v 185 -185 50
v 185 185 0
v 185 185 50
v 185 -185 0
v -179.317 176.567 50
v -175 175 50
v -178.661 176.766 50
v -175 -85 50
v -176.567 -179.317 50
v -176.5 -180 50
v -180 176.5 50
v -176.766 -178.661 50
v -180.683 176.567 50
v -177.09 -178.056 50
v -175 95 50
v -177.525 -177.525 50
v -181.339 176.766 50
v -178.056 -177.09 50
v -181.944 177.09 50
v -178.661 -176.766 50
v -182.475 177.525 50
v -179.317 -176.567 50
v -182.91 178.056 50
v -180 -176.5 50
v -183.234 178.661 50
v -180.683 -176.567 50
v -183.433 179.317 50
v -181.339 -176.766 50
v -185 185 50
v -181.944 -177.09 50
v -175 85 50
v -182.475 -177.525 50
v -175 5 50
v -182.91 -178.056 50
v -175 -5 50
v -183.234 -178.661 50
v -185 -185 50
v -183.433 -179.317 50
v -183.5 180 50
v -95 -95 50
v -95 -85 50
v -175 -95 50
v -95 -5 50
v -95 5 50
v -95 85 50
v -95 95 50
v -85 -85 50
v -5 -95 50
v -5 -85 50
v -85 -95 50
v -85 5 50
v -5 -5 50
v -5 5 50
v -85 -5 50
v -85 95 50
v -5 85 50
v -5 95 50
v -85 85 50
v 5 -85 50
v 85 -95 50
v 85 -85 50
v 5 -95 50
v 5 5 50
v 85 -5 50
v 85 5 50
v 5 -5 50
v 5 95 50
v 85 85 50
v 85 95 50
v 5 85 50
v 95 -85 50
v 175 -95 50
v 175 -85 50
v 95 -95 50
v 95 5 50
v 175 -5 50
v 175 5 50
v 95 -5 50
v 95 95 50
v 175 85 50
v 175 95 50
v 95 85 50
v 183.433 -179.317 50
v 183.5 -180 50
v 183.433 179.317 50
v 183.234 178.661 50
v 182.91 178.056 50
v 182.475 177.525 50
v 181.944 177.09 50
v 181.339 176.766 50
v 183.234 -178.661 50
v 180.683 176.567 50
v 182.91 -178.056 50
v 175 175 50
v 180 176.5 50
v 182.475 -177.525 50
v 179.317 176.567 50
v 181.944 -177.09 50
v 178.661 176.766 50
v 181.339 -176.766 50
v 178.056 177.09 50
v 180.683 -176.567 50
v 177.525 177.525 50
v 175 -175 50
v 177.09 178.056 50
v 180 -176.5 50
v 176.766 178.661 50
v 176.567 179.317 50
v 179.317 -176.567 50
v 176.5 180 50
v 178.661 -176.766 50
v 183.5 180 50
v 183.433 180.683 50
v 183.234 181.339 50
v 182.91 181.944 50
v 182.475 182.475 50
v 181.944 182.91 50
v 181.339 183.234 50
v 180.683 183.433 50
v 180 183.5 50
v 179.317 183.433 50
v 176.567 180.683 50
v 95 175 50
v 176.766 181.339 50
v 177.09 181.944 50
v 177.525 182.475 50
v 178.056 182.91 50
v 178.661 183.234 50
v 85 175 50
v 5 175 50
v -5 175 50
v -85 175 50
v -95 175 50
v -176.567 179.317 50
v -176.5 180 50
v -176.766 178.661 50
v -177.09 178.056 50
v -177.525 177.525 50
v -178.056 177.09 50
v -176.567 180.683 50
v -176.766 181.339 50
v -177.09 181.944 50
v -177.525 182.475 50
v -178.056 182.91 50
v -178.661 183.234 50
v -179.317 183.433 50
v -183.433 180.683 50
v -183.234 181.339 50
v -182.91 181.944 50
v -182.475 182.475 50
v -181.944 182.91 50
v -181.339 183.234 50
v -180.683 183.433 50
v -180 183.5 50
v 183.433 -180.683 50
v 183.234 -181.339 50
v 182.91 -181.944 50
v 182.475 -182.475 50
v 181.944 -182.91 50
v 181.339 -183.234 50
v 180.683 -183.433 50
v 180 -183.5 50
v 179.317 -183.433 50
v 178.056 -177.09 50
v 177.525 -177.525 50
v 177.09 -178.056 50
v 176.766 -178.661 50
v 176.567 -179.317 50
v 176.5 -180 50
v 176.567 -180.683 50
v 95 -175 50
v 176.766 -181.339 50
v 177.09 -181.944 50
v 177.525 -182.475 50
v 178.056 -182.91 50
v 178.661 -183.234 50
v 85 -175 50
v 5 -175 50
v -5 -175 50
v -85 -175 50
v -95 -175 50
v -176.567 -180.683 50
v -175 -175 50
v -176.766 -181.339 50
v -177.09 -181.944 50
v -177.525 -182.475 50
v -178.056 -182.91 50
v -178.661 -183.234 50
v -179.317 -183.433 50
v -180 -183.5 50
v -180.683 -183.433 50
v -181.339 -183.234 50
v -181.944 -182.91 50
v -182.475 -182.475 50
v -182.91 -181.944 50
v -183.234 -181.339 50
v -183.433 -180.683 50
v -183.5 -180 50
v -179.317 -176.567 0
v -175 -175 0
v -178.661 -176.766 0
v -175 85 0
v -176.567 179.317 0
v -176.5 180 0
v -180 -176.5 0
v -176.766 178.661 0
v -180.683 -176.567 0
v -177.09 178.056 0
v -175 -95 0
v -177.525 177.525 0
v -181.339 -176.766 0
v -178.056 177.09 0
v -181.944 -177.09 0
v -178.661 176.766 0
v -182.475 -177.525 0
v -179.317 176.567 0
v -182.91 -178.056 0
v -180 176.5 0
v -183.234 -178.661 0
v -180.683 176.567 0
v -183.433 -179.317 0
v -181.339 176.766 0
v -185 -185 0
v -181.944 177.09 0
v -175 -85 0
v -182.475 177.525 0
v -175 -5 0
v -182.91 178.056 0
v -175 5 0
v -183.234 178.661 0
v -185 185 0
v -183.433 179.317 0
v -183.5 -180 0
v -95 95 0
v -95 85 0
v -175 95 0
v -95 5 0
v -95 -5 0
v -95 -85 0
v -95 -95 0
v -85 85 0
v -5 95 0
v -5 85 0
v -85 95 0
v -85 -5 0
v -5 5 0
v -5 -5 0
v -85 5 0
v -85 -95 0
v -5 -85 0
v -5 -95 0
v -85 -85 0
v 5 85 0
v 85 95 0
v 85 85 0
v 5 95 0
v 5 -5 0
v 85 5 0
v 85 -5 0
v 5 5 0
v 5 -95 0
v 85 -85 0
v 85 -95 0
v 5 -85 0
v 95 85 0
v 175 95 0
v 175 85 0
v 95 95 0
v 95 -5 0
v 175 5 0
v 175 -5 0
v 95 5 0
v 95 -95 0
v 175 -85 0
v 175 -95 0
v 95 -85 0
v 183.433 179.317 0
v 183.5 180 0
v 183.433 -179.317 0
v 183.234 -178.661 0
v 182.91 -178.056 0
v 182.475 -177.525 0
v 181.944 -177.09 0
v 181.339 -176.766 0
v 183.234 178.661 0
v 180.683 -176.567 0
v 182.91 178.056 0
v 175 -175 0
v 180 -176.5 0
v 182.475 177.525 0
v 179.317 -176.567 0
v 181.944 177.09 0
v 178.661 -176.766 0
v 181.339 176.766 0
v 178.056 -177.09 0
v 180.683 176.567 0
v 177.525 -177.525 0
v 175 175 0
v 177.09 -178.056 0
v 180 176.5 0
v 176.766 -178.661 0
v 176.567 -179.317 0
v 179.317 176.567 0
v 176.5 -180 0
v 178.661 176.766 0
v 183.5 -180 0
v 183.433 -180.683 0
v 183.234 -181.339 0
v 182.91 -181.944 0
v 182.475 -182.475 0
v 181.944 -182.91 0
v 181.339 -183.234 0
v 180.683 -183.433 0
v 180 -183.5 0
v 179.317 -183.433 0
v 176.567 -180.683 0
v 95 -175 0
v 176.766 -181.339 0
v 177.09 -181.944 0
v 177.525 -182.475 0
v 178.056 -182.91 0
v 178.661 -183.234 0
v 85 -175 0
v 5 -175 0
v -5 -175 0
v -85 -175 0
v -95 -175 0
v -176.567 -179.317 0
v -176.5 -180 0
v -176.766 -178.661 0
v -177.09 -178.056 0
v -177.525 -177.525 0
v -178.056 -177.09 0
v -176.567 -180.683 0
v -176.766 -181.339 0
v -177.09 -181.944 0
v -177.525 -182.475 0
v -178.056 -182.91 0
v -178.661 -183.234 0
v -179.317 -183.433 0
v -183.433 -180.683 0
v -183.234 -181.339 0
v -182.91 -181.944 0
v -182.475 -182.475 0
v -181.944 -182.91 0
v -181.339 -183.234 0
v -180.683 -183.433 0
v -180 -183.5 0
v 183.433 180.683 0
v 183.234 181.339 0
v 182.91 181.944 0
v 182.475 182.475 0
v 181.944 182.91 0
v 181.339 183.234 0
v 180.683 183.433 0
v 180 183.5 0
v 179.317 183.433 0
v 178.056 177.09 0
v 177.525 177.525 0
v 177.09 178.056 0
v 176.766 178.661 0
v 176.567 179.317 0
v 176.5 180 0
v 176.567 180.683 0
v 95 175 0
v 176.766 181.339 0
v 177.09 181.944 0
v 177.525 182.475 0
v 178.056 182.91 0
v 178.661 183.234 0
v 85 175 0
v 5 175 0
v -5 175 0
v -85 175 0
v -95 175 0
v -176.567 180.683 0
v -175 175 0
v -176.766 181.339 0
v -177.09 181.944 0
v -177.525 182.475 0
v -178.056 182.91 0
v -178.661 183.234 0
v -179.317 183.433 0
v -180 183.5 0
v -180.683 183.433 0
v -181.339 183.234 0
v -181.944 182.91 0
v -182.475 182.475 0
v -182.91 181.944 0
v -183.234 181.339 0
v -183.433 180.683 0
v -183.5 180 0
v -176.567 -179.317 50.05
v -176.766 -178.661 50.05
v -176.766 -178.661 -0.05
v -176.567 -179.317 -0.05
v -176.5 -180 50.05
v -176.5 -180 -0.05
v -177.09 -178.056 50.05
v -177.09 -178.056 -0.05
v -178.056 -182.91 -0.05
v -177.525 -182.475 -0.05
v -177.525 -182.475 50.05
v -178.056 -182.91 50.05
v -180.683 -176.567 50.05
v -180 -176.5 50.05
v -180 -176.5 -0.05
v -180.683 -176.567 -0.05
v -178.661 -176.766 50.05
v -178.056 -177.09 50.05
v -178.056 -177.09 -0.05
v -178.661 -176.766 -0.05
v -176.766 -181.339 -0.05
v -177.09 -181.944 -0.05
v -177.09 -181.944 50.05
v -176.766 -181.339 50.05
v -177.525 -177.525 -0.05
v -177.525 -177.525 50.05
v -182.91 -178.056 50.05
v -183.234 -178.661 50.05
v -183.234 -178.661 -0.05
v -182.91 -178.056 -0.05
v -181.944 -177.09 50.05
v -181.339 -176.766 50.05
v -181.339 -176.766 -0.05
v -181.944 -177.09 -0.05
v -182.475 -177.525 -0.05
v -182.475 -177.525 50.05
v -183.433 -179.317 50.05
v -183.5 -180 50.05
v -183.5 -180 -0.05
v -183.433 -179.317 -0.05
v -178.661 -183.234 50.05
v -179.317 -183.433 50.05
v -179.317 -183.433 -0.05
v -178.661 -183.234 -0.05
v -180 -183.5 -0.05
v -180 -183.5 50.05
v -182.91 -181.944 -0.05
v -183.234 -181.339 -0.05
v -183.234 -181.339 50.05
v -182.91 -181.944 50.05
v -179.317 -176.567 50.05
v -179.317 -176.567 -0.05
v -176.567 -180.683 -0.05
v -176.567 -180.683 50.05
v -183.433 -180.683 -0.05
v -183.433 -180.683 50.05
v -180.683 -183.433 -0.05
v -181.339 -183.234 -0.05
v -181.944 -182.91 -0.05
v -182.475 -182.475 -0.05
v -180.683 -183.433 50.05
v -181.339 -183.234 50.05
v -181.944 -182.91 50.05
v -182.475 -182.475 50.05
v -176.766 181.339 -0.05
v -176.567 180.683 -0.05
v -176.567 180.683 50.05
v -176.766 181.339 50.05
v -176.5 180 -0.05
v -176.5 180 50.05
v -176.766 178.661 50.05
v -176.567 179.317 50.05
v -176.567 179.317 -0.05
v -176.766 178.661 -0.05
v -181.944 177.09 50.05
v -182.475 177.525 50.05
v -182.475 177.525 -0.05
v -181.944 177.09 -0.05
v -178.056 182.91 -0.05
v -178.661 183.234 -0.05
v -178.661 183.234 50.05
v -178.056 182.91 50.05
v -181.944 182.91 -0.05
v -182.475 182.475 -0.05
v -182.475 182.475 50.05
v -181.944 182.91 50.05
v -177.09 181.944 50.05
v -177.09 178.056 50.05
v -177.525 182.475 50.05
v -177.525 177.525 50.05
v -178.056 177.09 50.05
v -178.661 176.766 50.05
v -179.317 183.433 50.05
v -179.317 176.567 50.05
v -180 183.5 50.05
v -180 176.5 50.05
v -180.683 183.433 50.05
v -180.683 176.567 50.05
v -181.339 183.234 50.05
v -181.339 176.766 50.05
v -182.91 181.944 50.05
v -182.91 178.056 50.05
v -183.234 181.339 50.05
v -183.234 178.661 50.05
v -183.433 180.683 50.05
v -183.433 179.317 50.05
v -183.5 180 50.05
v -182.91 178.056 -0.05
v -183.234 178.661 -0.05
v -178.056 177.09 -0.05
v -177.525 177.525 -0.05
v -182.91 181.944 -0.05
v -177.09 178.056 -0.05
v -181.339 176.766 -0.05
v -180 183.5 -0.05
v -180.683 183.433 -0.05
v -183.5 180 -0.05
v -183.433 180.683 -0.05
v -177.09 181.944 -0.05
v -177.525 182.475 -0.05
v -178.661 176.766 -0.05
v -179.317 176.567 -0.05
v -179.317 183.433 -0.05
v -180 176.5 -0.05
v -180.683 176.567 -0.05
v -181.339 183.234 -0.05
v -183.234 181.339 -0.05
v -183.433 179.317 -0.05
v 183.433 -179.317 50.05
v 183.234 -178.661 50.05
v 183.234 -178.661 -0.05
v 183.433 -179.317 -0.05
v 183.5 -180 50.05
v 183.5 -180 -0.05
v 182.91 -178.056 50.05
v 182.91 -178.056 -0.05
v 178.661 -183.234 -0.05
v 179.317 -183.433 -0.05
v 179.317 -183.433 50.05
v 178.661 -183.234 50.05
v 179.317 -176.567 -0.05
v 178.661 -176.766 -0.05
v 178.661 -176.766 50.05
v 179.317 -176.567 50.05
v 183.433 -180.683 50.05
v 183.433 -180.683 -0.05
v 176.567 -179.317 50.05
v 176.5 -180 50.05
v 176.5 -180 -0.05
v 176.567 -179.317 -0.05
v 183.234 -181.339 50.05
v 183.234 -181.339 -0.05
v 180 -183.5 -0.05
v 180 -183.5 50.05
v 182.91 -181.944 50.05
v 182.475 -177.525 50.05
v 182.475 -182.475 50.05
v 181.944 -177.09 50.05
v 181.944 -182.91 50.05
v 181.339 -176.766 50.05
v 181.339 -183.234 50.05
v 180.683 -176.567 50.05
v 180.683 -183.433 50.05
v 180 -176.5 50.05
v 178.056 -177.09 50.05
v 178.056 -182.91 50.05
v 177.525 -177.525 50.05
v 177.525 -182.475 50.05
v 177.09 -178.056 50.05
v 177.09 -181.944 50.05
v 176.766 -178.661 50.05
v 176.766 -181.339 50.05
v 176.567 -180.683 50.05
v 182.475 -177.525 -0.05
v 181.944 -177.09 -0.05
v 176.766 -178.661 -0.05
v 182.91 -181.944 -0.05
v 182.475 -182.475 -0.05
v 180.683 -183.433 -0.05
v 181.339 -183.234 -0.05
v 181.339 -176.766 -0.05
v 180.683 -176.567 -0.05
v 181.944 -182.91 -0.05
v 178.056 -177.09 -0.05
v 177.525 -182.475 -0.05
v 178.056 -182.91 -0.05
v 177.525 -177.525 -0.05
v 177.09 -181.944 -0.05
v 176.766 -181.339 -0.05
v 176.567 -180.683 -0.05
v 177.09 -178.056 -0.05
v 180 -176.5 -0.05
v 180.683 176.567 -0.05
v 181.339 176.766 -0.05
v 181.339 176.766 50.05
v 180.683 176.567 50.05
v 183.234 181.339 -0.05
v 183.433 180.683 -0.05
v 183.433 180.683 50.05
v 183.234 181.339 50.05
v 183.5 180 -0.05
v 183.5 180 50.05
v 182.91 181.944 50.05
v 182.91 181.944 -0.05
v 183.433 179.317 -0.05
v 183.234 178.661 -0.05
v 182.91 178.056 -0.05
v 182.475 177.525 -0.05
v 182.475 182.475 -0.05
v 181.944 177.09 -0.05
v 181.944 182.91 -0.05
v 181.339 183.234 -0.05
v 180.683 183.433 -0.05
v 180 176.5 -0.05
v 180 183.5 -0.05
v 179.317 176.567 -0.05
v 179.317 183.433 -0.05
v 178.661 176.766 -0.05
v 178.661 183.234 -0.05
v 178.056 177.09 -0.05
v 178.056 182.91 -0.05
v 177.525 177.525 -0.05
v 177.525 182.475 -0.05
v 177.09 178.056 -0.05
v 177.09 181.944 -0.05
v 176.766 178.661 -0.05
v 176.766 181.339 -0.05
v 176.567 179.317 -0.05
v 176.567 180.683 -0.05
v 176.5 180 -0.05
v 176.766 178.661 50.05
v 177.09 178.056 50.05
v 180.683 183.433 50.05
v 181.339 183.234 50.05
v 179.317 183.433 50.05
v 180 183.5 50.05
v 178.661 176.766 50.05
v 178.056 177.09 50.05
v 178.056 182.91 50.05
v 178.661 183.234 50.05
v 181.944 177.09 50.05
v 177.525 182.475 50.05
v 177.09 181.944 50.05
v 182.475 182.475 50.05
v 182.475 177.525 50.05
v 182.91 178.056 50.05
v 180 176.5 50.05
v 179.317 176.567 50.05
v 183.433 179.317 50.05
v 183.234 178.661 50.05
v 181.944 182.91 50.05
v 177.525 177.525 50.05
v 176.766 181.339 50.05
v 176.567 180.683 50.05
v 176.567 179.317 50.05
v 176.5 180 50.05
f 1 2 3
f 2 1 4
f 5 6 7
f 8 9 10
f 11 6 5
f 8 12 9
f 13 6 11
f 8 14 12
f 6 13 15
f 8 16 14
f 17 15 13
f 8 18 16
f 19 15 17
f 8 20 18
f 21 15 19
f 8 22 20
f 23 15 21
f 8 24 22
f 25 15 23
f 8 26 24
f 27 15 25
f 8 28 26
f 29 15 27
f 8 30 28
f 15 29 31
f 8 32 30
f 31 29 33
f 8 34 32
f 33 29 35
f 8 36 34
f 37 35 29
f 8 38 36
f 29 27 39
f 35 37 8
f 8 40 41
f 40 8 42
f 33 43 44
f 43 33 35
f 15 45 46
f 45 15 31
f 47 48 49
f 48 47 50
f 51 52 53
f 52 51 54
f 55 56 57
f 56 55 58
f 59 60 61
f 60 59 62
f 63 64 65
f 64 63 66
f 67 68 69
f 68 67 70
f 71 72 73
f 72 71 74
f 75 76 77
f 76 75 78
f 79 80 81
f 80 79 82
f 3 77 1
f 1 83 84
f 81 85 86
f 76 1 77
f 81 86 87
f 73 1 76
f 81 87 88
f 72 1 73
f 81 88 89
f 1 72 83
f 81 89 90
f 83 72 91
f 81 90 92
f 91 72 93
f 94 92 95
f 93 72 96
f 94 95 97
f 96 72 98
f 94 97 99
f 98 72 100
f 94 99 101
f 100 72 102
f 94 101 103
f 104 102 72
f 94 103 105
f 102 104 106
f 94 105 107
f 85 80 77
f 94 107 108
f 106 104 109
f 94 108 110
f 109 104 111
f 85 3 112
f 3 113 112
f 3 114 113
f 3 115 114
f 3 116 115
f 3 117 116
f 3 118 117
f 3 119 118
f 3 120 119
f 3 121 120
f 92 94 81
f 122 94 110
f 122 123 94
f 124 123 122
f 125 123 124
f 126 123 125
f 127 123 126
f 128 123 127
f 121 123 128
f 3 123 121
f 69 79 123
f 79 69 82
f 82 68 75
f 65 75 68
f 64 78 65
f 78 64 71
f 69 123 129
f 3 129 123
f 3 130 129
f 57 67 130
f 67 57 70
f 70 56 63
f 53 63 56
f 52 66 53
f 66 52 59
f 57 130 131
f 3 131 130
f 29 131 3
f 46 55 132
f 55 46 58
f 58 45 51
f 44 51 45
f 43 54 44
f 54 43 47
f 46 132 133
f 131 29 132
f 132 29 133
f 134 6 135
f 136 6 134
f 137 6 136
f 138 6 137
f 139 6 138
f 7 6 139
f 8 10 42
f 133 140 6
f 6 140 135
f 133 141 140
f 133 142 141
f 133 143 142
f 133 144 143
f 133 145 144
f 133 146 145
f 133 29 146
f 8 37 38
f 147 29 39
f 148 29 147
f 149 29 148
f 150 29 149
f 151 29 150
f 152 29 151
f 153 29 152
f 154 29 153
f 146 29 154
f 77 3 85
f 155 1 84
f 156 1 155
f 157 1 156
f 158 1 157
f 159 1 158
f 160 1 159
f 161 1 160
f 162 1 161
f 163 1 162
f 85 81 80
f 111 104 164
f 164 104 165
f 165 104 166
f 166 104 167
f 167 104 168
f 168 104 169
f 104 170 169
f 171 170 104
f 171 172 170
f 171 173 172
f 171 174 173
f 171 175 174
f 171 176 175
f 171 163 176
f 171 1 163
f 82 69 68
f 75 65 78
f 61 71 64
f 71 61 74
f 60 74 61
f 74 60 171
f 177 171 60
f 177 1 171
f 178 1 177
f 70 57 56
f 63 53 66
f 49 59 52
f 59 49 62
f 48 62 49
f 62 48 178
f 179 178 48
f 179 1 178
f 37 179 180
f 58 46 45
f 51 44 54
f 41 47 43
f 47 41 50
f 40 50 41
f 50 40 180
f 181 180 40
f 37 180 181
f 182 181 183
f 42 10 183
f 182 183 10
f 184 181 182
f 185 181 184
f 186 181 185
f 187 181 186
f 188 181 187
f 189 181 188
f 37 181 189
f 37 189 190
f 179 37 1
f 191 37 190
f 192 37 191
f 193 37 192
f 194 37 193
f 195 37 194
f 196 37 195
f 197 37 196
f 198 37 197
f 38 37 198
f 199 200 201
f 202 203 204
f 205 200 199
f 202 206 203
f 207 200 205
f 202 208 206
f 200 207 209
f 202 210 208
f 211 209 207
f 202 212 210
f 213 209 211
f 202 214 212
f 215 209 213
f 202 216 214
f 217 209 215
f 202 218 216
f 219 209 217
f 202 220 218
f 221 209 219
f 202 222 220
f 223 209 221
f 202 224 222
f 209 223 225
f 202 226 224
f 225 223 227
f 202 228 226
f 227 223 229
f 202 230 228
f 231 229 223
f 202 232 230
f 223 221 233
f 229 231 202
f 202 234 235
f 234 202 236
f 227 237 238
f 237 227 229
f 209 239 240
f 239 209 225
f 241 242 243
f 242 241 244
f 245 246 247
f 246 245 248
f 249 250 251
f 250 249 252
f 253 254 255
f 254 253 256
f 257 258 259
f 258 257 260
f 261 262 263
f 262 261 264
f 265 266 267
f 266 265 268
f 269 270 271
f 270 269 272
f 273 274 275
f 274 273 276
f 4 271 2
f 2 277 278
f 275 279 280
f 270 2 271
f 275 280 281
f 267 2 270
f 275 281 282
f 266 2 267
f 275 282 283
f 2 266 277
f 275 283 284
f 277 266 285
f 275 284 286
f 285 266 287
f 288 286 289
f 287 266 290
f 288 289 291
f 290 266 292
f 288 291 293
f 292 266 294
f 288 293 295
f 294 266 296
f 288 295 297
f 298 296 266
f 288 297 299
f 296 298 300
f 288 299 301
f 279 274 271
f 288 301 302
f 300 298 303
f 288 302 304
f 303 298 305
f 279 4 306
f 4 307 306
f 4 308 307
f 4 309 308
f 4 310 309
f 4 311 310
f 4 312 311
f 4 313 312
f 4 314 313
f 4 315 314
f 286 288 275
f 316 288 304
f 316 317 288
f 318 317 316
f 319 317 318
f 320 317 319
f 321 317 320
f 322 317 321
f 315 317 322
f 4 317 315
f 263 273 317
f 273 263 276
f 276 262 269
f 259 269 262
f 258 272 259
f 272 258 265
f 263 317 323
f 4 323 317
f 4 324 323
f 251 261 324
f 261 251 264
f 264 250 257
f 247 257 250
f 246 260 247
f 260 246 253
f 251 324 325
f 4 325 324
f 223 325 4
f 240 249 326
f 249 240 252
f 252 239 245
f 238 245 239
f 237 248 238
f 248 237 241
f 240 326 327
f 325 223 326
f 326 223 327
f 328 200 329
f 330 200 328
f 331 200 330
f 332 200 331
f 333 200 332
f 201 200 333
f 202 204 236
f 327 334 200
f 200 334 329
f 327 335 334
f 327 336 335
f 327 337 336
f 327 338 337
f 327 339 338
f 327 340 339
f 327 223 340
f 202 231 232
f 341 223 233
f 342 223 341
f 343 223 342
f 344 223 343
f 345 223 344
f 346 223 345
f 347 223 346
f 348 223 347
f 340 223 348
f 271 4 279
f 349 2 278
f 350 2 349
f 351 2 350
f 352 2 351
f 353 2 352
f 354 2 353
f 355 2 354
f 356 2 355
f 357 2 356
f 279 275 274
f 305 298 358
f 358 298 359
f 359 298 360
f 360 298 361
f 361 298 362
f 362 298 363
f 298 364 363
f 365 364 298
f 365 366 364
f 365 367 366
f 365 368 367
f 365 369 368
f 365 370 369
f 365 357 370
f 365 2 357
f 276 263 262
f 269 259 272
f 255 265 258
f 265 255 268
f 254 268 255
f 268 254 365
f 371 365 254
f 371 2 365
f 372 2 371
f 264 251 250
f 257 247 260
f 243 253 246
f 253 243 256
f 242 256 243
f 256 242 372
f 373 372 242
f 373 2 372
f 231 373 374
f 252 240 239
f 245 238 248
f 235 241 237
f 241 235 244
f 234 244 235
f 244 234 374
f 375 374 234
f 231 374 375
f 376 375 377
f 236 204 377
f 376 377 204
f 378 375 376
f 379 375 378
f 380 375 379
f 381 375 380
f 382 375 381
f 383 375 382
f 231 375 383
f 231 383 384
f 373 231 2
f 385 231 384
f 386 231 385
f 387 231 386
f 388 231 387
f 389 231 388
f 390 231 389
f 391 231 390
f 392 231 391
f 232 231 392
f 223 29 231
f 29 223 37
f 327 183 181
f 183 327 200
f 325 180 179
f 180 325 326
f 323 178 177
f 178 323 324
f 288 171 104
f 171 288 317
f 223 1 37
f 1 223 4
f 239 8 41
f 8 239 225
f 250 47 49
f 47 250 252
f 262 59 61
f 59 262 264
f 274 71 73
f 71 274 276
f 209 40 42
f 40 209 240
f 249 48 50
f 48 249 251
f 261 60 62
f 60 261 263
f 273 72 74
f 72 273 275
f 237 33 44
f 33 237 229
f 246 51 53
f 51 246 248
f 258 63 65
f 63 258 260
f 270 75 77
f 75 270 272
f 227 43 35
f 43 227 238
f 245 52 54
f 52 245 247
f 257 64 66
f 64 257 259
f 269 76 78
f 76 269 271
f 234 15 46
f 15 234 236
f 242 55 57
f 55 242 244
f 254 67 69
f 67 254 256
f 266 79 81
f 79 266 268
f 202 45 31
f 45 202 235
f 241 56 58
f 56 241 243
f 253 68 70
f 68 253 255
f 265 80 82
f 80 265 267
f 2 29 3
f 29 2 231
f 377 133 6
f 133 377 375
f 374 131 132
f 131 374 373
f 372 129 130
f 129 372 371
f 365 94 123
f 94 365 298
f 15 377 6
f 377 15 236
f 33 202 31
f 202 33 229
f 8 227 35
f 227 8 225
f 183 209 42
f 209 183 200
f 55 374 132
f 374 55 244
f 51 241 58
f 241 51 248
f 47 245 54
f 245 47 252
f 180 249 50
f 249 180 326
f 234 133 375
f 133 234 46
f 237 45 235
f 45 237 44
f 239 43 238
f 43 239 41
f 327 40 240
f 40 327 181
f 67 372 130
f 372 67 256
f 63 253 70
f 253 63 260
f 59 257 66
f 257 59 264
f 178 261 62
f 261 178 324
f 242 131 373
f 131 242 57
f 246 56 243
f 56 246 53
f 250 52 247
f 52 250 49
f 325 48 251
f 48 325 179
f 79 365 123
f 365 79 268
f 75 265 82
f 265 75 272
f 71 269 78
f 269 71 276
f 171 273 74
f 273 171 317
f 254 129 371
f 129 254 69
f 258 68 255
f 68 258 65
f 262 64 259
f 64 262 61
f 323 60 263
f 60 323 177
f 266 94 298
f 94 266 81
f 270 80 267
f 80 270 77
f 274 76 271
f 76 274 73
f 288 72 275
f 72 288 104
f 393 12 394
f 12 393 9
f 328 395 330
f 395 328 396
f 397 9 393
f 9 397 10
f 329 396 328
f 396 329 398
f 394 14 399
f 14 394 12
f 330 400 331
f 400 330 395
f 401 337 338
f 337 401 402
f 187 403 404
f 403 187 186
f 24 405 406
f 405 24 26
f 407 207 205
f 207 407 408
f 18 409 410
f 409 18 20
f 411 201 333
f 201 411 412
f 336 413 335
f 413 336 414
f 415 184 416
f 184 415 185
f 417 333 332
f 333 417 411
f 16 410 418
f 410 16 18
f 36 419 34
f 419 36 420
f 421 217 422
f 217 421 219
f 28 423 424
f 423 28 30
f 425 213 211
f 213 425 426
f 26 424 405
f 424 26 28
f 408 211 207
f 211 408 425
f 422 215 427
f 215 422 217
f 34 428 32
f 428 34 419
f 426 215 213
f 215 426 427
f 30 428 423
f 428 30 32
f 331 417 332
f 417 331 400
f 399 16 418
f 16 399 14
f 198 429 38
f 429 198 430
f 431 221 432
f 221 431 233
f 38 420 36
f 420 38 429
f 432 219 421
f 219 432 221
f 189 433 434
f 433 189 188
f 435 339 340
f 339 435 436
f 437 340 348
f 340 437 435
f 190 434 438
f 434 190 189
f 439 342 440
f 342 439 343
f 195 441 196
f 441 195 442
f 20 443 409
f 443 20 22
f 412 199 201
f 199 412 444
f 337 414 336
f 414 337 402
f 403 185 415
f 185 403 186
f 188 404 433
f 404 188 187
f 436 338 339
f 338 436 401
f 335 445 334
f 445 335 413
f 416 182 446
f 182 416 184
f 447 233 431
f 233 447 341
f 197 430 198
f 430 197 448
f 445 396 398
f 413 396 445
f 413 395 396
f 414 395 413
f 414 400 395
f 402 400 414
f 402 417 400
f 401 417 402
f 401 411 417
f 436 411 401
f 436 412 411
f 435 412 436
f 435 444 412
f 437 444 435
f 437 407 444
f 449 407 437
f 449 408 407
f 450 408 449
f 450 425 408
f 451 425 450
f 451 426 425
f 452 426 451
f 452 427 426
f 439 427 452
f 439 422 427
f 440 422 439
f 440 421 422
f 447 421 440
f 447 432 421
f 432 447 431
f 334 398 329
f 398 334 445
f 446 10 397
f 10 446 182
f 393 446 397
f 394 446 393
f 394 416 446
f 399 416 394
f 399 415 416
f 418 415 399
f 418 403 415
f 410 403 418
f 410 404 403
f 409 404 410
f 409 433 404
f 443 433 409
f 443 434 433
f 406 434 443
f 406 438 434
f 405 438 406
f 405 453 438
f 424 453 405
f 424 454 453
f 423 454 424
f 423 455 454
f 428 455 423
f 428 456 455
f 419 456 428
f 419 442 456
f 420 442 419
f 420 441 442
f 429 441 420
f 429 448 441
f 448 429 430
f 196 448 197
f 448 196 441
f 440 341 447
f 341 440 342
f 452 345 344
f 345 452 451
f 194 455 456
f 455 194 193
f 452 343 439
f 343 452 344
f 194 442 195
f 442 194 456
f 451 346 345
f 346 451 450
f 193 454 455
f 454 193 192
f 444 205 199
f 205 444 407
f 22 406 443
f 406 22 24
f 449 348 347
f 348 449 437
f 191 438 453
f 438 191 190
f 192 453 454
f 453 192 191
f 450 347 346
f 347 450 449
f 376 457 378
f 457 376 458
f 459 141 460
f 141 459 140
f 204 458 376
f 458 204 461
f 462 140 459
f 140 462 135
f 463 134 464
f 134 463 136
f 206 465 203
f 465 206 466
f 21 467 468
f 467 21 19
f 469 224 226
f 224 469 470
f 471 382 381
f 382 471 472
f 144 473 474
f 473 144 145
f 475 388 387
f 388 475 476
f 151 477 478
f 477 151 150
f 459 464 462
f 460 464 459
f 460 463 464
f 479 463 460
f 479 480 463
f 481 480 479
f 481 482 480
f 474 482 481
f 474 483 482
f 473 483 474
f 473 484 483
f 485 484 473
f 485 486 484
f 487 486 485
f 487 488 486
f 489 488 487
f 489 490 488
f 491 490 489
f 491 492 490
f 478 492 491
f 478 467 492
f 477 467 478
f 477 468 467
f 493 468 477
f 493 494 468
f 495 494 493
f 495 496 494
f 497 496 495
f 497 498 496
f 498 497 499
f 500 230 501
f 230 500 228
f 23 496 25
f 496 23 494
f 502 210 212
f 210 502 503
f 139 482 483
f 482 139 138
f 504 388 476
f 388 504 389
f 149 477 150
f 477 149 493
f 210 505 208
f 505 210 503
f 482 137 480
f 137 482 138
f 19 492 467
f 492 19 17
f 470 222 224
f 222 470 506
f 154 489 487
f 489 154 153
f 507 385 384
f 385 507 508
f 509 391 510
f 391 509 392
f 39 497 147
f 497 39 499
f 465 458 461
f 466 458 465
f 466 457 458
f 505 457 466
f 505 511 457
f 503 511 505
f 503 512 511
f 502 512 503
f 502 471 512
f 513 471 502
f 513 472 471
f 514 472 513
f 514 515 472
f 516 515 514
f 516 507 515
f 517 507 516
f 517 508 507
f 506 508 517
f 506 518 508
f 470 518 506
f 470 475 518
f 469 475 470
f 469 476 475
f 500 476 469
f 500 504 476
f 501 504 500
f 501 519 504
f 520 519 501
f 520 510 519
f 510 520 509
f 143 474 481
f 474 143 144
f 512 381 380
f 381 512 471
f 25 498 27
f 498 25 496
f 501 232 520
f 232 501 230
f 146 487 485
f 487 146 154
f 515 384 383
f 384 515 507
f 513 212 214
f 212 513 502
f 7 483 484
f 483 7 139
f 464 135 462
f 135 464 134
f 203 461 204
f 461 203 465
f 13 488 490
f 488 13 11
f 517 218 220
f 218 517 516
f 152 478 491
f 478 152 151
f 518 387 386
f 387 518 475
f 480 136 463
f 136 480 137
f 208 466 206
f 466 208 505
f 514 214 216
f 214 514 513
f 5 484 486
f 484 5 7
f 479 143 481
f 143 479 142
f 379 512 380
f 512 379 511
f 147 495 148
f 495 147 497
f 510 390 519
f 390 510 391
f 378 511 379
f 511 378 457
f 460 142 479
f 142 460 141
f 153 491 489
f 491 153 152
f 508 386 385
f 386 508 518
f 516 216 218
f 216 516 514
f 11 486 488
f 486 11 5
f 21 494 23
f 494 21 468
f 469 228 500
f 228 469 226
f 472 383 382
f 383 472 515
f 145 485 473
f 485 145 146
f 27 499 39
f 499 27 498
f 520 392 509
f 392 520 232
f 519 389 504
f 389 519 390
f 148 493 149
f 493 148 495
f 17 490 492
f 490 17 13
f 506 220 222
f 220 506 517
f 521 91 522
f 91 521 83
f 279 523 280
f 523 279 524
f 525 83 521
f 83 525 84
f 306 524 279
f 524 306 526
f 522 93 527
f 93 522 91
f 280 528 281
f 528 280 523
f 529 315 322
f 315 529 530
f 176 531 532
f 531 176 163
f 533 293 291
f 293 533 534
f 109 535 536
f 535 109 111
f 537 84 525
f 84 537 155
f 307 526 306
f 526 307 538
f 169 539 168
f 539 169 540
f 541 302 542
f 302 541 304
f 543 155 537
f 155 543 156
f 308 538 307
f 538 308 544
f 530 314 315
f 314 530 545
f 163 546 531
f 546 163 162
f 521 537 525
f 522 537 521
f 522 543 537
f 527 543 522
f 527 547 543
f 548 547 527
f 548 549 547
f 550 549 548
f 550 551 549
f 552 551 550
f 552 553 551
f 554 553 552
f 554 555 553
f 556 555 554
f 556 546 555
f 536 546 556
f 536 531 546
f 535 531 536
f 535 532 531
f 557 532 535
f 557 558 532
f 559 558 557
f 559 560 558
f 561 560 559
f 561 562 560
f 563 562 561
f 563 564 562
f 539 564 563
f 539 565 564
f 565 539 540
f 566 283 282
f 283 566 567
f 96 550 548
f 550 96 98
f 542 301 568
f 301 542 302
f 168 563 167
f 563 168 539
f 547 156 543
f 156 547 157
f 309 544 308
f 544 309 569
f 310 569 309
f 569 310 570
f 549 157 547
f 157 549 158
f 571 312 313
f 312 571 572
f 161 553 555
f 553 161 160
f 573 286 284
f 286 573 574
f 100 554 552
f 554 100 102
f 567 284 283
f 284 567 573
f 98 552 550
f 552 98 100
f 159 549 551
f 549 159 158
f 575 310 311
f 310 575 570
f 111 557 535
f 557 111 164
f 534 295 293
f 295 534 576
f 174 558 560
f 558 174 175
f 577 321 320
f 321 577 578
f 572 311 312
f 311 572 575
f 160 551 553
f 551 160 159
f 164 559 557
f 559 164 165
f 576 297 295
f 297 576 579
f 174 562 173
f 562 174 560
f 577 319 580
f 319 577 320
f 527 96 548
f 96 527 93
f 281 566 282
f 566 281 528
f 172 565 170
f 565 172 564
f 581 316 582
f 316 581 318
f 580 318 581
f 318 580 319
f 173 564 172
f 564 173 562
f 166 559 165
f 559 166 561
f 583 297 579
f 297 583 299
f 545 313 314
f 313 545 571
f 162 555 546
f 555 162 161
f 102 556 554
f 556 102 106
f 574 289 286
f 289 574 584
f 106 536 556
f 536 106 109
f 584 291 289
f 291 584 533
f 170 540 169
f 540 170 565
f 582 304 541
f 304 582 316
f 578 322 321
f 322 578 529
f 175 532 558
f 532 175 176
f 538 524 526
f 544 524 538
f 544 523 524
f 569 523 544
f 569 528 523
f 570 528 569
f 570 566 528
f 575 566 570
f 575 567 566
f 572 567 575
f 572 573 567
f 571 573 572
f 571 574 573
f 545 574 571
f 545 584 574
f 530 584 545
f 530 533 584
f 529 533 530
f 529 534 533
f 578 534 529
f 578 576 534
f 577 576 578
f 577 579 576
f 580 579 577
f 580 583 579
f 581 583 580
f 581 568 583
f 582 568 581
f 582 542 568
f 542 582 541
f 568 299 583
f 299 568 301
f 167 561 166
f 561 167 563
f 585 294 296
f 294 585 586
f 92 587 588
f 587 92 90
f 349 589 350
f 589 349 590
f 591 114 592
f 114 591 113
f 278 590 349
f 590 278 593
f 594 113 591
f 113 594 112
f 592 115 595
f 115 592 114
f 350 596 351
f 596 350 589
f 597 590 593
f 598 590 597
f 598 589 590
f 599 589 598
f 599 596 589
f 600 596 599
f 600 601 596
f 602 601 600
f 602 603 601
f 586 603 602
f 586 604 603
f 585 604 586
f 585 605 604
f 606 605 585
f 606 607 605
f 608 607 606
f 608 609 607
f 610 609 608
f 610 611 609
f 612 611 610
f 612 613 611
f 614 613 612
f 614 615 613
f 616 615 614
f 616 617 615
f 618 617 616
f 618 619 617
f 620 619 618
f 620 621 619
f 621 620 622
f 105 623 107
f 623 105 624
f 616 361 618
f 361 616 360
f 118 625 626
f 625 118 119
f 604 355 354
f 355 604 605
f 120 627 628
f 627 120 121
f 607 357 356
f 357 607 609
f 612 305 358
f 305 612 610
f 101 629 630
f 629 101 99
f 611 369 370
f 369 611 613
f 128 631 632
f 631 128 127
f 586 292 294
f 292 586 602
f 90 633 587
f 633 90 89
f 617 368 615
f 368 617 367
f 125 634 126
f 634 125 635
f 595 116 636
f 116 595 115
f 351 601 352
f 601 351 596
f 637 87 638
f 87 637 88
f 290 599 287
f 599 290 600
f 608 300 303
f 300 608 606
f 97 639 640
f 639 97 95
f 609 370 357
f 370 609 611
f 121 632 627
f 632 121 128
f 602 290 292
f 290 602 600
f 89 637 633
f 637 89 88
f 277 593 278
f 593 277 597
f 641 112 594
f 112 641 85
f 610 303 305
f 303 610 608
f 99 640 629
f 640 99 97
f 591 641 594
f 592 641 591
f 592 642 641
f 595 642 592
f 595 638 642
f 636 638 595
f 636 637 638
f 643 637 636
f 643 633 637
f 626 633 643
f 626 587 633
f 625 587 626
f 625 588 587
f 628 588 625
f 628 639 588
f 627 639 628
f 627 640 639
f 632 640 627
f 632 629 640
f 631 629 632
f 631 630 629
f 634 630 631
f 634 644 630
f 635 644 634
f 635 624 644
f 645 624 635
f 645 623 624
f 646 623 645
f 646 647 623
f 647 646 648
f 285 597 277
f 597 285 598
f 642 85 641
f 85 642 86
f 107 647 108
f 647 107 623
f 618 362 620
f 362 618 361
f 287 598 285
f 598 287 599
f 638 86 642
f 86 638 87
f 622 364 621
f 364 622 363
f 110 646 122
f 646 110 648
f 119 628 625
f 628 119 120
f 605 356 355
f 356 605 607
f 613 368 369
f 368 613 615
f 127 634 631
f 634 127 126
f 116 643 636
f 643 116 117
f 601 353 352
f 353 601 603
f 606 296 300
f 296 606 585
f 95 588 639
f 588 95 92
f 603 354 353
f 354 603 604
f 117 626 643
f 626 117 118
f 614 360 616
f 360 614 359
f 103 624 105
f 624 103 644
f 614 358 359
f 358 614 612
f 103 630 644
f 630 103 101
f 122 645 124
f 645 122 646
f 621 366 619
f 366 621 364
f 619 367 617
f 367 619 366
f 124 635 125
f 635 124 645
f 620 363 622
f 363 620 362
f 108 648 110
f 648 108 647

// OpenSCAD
// Part Name: Cage_Layer_6_H50mm
// This part represents a horizontal slice of the cage.
// It is designed to be 3D printed on its base.

// Parameters for the cage
bar_t = 10;
gap_xy = 80;
hole_d = 7;
cage_ext_xy = 370;

// Calculate bar center positions relative to the overall cage center
bar_centers_xy = [for (j = [0:4]) (-cage_ext_xy/2 + bar_t/2 + j * (bar_t + gap_xy))];

// Module to generate a single layer segment
module cage_layer_segment(height) {
    // Offset for printing on z=0 plane. The module itself is centered on XY=0, so this Z offset moves its base to Z=0.
    translate([0, 0, height/2]) {
        union() {
            // Horizontal bars (along X)
            for (y_center = bar_centers_xy) {
                translate([0, y_center, 0])
                cube([cage_ext_xy, bar_t, height], center = true);
            }

            // Vertical bars (along Y)
            for (x_center = bar_centers_xy) {
                translate([x_center, 0, 0])
                cube([bar_t, cage_ext_xy, height], center = true);
            }

            // Subtract holes for M6 rods at the 4 corners
            corner_offsets_xy = [bar_centers_xy[0], bar_centers_xy[4]];

            for (x_offset = corner_offsets_xy) {
                for (y_offset = corner_offsets_xy) {
                    // Hole through the center of the corner bar
                    translate([x_offset, y_offset, 0])
                    cylinder(h = height + 0.1, d = hole_d, center = true, $fn=32); // +0.1 for clean cut
                }
            }
        }
    }
}

// Render the segment
cage_layer_segment(50);
